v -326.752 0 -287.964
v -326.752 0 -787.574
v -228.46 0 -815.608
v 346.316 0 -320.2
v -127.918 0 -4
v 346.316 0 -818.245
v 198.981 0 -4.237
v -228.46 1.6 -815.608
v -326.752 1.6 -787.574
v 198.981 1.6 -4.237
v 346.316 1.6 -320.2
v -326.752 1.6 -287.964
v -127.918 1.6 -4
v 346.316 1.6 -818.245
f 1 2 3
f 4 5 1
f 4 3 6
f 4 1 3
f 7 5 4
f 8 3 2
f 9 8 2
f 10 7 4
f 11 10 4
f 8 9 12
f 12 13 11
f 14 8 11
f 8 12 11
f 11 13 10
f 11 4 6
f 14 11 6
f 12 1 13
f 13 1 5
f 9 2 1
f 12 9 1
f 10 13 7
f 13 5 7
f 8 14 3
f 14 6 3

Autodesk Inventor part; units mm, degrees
ref_plane "YZ Plane" through (0, 0, 0) normal (1, 0, 0) x (0, 1, 0)
ref_plane "XZ Plane" through (0, 0, 0) normal (0, 1, 0) x (-1, 0, 0)
ref_plane "XY Plane" through (0, 0, 0) normal (0, 0, 1) x (1, 0, 0)
ref_plane "Work Plane1" through (-244.516826, 0, -292.10783) normal (0, -1, 0) x (1, 0, 0)
sketch "Sketch1" plane through (-244.516826, 0, -292.10783) normal (0, -1, 0) x (1, 0, 0)
  line L0 (-82.234926, -443.016385) -> (-82.234926, 4.14342)
  line L1 (16.056549, -523.499895) -> (-89.634926, -493.408338)
  line L2 (-82.234926, 4.14342) -> (116.599095, 288.10783)
  line L3 (116.599095, 288.10783) -> (240.516826, 288.10783)
  line L4 (590.833218, -28.092085) -> (443.497514, 287.870352)
  line L5 (590.833218, -526.137374) -> (590.833218, -28.092085)
  point P0 (244.516826, 292.10783)
sketch "Sketch2" plane through (-244.516826, 0, -292.10783) normal (0, -1, 0) x (1, 0, 0)
  line L0 (16.056549, -523.499895) -> (-82.234926, -495.466532)
  line L1 (-82.234926, -495.466532) -> (-82.234926, 4.14342)
  line L2 (-82.234926, 4.14342) -> (116.599095, 288.10783)
  line L3 (116.599095, 288.10783) -> (443.497514, 287.870352)
  line L4 (443.497514, 287.870352) -> (590.833218, -28.092085)
  line L5 (590.833218, -28.092085) -> (590.833218, -526.137374)
  line L6 (590.833218, -523.499895) -> (16.056549, -523.499895)
  point P0 (244.516826, 292.10783)
sketch "Sketch2 outline for Plate extrude" plane through (-244.516826, 0, -292.10783) normal (0, -1, 0) x (1, 0, 0)
  line L0 (16.056549, -523.499895) -> (-82.234926, -495.466532)
  line L1 (-82.234926, -495.466532) -> (-82.234926, 4.14342)
  line L2 (-82.234926, 4.14342) -> (116.599095, 288.10783)
  line L3 (116.599095, 288.10783) -> (443.497514, 287.870352)
  line L4 (443.497514, 287.870352) -> (590.833218, -28.092085)
  line L5 (590.833218, -28.092085) -> (590.833218, -526.137374)
  line L6 (590.833218, -526.137374) -> (16.056549, -523.499895)
extrude "Plate extrude" add sketch "Sketch2 outline for Plate extrude" against normal blind 1.6
sketch "Sketch3" plane through (-244.516826, 0, -292.10783) normal (0, -1, 0) x (1, 0, 0)
  circle A0 centre (303.423661, -47.967523) radius 80.5 construction
  circle A1 centre (303.423661, -45.120279) radius 75 construction
  line L0 (153.423661, 104.879721) -> (453.423661, 104.879721)
  line L1 (453.423661, 104.879721) -> (453.423661, -195.120279)
  line L2 (453.423661, -195.120279) -> (153.423661, -195.120279)
  line L3 (153.423661, -195.120279) -> (153.423661, 104.879721)
  line L4 (153.423661, 104.879721) -> (453.423661, -195.120279) construction
  line L5 (453.423661, 104.879721) -> (153.423661, -195.120279) construction
  point P0 (244.516826, 292.10783)
  dimension "d3" = 300
  dimension "d4" = 300
extrude "Tailstock door" [suppressed]
sketch "Sketch4" plane through (-244.516826, 0, -292.10783) normal (0, -1, 0) x (1, 0, 0)
  circle A0 centre (303.423661, -45.120279) radius 75 construction
  circle A1 centre (303.423661, -45.120279) radius 81.28
  circle A2 centre (303.423661, -45.330045) radius 80.5 construction
  point P0 (244.516826, 292.10783)
  dimension "d7" = 162.56
  dimension "d8" = 161
extrude "Headstock cut out" [suppressed]
sketch "Sketch5" plane through (-244.516826, 1.6, -292.10783) normal (0, 1, 0) x (1, 0, 0)
  point P0 (244.516826, -292.10783)
  point P1 (303.423661, 45.330045)
properties part number "side cover plate.ipt-01"
